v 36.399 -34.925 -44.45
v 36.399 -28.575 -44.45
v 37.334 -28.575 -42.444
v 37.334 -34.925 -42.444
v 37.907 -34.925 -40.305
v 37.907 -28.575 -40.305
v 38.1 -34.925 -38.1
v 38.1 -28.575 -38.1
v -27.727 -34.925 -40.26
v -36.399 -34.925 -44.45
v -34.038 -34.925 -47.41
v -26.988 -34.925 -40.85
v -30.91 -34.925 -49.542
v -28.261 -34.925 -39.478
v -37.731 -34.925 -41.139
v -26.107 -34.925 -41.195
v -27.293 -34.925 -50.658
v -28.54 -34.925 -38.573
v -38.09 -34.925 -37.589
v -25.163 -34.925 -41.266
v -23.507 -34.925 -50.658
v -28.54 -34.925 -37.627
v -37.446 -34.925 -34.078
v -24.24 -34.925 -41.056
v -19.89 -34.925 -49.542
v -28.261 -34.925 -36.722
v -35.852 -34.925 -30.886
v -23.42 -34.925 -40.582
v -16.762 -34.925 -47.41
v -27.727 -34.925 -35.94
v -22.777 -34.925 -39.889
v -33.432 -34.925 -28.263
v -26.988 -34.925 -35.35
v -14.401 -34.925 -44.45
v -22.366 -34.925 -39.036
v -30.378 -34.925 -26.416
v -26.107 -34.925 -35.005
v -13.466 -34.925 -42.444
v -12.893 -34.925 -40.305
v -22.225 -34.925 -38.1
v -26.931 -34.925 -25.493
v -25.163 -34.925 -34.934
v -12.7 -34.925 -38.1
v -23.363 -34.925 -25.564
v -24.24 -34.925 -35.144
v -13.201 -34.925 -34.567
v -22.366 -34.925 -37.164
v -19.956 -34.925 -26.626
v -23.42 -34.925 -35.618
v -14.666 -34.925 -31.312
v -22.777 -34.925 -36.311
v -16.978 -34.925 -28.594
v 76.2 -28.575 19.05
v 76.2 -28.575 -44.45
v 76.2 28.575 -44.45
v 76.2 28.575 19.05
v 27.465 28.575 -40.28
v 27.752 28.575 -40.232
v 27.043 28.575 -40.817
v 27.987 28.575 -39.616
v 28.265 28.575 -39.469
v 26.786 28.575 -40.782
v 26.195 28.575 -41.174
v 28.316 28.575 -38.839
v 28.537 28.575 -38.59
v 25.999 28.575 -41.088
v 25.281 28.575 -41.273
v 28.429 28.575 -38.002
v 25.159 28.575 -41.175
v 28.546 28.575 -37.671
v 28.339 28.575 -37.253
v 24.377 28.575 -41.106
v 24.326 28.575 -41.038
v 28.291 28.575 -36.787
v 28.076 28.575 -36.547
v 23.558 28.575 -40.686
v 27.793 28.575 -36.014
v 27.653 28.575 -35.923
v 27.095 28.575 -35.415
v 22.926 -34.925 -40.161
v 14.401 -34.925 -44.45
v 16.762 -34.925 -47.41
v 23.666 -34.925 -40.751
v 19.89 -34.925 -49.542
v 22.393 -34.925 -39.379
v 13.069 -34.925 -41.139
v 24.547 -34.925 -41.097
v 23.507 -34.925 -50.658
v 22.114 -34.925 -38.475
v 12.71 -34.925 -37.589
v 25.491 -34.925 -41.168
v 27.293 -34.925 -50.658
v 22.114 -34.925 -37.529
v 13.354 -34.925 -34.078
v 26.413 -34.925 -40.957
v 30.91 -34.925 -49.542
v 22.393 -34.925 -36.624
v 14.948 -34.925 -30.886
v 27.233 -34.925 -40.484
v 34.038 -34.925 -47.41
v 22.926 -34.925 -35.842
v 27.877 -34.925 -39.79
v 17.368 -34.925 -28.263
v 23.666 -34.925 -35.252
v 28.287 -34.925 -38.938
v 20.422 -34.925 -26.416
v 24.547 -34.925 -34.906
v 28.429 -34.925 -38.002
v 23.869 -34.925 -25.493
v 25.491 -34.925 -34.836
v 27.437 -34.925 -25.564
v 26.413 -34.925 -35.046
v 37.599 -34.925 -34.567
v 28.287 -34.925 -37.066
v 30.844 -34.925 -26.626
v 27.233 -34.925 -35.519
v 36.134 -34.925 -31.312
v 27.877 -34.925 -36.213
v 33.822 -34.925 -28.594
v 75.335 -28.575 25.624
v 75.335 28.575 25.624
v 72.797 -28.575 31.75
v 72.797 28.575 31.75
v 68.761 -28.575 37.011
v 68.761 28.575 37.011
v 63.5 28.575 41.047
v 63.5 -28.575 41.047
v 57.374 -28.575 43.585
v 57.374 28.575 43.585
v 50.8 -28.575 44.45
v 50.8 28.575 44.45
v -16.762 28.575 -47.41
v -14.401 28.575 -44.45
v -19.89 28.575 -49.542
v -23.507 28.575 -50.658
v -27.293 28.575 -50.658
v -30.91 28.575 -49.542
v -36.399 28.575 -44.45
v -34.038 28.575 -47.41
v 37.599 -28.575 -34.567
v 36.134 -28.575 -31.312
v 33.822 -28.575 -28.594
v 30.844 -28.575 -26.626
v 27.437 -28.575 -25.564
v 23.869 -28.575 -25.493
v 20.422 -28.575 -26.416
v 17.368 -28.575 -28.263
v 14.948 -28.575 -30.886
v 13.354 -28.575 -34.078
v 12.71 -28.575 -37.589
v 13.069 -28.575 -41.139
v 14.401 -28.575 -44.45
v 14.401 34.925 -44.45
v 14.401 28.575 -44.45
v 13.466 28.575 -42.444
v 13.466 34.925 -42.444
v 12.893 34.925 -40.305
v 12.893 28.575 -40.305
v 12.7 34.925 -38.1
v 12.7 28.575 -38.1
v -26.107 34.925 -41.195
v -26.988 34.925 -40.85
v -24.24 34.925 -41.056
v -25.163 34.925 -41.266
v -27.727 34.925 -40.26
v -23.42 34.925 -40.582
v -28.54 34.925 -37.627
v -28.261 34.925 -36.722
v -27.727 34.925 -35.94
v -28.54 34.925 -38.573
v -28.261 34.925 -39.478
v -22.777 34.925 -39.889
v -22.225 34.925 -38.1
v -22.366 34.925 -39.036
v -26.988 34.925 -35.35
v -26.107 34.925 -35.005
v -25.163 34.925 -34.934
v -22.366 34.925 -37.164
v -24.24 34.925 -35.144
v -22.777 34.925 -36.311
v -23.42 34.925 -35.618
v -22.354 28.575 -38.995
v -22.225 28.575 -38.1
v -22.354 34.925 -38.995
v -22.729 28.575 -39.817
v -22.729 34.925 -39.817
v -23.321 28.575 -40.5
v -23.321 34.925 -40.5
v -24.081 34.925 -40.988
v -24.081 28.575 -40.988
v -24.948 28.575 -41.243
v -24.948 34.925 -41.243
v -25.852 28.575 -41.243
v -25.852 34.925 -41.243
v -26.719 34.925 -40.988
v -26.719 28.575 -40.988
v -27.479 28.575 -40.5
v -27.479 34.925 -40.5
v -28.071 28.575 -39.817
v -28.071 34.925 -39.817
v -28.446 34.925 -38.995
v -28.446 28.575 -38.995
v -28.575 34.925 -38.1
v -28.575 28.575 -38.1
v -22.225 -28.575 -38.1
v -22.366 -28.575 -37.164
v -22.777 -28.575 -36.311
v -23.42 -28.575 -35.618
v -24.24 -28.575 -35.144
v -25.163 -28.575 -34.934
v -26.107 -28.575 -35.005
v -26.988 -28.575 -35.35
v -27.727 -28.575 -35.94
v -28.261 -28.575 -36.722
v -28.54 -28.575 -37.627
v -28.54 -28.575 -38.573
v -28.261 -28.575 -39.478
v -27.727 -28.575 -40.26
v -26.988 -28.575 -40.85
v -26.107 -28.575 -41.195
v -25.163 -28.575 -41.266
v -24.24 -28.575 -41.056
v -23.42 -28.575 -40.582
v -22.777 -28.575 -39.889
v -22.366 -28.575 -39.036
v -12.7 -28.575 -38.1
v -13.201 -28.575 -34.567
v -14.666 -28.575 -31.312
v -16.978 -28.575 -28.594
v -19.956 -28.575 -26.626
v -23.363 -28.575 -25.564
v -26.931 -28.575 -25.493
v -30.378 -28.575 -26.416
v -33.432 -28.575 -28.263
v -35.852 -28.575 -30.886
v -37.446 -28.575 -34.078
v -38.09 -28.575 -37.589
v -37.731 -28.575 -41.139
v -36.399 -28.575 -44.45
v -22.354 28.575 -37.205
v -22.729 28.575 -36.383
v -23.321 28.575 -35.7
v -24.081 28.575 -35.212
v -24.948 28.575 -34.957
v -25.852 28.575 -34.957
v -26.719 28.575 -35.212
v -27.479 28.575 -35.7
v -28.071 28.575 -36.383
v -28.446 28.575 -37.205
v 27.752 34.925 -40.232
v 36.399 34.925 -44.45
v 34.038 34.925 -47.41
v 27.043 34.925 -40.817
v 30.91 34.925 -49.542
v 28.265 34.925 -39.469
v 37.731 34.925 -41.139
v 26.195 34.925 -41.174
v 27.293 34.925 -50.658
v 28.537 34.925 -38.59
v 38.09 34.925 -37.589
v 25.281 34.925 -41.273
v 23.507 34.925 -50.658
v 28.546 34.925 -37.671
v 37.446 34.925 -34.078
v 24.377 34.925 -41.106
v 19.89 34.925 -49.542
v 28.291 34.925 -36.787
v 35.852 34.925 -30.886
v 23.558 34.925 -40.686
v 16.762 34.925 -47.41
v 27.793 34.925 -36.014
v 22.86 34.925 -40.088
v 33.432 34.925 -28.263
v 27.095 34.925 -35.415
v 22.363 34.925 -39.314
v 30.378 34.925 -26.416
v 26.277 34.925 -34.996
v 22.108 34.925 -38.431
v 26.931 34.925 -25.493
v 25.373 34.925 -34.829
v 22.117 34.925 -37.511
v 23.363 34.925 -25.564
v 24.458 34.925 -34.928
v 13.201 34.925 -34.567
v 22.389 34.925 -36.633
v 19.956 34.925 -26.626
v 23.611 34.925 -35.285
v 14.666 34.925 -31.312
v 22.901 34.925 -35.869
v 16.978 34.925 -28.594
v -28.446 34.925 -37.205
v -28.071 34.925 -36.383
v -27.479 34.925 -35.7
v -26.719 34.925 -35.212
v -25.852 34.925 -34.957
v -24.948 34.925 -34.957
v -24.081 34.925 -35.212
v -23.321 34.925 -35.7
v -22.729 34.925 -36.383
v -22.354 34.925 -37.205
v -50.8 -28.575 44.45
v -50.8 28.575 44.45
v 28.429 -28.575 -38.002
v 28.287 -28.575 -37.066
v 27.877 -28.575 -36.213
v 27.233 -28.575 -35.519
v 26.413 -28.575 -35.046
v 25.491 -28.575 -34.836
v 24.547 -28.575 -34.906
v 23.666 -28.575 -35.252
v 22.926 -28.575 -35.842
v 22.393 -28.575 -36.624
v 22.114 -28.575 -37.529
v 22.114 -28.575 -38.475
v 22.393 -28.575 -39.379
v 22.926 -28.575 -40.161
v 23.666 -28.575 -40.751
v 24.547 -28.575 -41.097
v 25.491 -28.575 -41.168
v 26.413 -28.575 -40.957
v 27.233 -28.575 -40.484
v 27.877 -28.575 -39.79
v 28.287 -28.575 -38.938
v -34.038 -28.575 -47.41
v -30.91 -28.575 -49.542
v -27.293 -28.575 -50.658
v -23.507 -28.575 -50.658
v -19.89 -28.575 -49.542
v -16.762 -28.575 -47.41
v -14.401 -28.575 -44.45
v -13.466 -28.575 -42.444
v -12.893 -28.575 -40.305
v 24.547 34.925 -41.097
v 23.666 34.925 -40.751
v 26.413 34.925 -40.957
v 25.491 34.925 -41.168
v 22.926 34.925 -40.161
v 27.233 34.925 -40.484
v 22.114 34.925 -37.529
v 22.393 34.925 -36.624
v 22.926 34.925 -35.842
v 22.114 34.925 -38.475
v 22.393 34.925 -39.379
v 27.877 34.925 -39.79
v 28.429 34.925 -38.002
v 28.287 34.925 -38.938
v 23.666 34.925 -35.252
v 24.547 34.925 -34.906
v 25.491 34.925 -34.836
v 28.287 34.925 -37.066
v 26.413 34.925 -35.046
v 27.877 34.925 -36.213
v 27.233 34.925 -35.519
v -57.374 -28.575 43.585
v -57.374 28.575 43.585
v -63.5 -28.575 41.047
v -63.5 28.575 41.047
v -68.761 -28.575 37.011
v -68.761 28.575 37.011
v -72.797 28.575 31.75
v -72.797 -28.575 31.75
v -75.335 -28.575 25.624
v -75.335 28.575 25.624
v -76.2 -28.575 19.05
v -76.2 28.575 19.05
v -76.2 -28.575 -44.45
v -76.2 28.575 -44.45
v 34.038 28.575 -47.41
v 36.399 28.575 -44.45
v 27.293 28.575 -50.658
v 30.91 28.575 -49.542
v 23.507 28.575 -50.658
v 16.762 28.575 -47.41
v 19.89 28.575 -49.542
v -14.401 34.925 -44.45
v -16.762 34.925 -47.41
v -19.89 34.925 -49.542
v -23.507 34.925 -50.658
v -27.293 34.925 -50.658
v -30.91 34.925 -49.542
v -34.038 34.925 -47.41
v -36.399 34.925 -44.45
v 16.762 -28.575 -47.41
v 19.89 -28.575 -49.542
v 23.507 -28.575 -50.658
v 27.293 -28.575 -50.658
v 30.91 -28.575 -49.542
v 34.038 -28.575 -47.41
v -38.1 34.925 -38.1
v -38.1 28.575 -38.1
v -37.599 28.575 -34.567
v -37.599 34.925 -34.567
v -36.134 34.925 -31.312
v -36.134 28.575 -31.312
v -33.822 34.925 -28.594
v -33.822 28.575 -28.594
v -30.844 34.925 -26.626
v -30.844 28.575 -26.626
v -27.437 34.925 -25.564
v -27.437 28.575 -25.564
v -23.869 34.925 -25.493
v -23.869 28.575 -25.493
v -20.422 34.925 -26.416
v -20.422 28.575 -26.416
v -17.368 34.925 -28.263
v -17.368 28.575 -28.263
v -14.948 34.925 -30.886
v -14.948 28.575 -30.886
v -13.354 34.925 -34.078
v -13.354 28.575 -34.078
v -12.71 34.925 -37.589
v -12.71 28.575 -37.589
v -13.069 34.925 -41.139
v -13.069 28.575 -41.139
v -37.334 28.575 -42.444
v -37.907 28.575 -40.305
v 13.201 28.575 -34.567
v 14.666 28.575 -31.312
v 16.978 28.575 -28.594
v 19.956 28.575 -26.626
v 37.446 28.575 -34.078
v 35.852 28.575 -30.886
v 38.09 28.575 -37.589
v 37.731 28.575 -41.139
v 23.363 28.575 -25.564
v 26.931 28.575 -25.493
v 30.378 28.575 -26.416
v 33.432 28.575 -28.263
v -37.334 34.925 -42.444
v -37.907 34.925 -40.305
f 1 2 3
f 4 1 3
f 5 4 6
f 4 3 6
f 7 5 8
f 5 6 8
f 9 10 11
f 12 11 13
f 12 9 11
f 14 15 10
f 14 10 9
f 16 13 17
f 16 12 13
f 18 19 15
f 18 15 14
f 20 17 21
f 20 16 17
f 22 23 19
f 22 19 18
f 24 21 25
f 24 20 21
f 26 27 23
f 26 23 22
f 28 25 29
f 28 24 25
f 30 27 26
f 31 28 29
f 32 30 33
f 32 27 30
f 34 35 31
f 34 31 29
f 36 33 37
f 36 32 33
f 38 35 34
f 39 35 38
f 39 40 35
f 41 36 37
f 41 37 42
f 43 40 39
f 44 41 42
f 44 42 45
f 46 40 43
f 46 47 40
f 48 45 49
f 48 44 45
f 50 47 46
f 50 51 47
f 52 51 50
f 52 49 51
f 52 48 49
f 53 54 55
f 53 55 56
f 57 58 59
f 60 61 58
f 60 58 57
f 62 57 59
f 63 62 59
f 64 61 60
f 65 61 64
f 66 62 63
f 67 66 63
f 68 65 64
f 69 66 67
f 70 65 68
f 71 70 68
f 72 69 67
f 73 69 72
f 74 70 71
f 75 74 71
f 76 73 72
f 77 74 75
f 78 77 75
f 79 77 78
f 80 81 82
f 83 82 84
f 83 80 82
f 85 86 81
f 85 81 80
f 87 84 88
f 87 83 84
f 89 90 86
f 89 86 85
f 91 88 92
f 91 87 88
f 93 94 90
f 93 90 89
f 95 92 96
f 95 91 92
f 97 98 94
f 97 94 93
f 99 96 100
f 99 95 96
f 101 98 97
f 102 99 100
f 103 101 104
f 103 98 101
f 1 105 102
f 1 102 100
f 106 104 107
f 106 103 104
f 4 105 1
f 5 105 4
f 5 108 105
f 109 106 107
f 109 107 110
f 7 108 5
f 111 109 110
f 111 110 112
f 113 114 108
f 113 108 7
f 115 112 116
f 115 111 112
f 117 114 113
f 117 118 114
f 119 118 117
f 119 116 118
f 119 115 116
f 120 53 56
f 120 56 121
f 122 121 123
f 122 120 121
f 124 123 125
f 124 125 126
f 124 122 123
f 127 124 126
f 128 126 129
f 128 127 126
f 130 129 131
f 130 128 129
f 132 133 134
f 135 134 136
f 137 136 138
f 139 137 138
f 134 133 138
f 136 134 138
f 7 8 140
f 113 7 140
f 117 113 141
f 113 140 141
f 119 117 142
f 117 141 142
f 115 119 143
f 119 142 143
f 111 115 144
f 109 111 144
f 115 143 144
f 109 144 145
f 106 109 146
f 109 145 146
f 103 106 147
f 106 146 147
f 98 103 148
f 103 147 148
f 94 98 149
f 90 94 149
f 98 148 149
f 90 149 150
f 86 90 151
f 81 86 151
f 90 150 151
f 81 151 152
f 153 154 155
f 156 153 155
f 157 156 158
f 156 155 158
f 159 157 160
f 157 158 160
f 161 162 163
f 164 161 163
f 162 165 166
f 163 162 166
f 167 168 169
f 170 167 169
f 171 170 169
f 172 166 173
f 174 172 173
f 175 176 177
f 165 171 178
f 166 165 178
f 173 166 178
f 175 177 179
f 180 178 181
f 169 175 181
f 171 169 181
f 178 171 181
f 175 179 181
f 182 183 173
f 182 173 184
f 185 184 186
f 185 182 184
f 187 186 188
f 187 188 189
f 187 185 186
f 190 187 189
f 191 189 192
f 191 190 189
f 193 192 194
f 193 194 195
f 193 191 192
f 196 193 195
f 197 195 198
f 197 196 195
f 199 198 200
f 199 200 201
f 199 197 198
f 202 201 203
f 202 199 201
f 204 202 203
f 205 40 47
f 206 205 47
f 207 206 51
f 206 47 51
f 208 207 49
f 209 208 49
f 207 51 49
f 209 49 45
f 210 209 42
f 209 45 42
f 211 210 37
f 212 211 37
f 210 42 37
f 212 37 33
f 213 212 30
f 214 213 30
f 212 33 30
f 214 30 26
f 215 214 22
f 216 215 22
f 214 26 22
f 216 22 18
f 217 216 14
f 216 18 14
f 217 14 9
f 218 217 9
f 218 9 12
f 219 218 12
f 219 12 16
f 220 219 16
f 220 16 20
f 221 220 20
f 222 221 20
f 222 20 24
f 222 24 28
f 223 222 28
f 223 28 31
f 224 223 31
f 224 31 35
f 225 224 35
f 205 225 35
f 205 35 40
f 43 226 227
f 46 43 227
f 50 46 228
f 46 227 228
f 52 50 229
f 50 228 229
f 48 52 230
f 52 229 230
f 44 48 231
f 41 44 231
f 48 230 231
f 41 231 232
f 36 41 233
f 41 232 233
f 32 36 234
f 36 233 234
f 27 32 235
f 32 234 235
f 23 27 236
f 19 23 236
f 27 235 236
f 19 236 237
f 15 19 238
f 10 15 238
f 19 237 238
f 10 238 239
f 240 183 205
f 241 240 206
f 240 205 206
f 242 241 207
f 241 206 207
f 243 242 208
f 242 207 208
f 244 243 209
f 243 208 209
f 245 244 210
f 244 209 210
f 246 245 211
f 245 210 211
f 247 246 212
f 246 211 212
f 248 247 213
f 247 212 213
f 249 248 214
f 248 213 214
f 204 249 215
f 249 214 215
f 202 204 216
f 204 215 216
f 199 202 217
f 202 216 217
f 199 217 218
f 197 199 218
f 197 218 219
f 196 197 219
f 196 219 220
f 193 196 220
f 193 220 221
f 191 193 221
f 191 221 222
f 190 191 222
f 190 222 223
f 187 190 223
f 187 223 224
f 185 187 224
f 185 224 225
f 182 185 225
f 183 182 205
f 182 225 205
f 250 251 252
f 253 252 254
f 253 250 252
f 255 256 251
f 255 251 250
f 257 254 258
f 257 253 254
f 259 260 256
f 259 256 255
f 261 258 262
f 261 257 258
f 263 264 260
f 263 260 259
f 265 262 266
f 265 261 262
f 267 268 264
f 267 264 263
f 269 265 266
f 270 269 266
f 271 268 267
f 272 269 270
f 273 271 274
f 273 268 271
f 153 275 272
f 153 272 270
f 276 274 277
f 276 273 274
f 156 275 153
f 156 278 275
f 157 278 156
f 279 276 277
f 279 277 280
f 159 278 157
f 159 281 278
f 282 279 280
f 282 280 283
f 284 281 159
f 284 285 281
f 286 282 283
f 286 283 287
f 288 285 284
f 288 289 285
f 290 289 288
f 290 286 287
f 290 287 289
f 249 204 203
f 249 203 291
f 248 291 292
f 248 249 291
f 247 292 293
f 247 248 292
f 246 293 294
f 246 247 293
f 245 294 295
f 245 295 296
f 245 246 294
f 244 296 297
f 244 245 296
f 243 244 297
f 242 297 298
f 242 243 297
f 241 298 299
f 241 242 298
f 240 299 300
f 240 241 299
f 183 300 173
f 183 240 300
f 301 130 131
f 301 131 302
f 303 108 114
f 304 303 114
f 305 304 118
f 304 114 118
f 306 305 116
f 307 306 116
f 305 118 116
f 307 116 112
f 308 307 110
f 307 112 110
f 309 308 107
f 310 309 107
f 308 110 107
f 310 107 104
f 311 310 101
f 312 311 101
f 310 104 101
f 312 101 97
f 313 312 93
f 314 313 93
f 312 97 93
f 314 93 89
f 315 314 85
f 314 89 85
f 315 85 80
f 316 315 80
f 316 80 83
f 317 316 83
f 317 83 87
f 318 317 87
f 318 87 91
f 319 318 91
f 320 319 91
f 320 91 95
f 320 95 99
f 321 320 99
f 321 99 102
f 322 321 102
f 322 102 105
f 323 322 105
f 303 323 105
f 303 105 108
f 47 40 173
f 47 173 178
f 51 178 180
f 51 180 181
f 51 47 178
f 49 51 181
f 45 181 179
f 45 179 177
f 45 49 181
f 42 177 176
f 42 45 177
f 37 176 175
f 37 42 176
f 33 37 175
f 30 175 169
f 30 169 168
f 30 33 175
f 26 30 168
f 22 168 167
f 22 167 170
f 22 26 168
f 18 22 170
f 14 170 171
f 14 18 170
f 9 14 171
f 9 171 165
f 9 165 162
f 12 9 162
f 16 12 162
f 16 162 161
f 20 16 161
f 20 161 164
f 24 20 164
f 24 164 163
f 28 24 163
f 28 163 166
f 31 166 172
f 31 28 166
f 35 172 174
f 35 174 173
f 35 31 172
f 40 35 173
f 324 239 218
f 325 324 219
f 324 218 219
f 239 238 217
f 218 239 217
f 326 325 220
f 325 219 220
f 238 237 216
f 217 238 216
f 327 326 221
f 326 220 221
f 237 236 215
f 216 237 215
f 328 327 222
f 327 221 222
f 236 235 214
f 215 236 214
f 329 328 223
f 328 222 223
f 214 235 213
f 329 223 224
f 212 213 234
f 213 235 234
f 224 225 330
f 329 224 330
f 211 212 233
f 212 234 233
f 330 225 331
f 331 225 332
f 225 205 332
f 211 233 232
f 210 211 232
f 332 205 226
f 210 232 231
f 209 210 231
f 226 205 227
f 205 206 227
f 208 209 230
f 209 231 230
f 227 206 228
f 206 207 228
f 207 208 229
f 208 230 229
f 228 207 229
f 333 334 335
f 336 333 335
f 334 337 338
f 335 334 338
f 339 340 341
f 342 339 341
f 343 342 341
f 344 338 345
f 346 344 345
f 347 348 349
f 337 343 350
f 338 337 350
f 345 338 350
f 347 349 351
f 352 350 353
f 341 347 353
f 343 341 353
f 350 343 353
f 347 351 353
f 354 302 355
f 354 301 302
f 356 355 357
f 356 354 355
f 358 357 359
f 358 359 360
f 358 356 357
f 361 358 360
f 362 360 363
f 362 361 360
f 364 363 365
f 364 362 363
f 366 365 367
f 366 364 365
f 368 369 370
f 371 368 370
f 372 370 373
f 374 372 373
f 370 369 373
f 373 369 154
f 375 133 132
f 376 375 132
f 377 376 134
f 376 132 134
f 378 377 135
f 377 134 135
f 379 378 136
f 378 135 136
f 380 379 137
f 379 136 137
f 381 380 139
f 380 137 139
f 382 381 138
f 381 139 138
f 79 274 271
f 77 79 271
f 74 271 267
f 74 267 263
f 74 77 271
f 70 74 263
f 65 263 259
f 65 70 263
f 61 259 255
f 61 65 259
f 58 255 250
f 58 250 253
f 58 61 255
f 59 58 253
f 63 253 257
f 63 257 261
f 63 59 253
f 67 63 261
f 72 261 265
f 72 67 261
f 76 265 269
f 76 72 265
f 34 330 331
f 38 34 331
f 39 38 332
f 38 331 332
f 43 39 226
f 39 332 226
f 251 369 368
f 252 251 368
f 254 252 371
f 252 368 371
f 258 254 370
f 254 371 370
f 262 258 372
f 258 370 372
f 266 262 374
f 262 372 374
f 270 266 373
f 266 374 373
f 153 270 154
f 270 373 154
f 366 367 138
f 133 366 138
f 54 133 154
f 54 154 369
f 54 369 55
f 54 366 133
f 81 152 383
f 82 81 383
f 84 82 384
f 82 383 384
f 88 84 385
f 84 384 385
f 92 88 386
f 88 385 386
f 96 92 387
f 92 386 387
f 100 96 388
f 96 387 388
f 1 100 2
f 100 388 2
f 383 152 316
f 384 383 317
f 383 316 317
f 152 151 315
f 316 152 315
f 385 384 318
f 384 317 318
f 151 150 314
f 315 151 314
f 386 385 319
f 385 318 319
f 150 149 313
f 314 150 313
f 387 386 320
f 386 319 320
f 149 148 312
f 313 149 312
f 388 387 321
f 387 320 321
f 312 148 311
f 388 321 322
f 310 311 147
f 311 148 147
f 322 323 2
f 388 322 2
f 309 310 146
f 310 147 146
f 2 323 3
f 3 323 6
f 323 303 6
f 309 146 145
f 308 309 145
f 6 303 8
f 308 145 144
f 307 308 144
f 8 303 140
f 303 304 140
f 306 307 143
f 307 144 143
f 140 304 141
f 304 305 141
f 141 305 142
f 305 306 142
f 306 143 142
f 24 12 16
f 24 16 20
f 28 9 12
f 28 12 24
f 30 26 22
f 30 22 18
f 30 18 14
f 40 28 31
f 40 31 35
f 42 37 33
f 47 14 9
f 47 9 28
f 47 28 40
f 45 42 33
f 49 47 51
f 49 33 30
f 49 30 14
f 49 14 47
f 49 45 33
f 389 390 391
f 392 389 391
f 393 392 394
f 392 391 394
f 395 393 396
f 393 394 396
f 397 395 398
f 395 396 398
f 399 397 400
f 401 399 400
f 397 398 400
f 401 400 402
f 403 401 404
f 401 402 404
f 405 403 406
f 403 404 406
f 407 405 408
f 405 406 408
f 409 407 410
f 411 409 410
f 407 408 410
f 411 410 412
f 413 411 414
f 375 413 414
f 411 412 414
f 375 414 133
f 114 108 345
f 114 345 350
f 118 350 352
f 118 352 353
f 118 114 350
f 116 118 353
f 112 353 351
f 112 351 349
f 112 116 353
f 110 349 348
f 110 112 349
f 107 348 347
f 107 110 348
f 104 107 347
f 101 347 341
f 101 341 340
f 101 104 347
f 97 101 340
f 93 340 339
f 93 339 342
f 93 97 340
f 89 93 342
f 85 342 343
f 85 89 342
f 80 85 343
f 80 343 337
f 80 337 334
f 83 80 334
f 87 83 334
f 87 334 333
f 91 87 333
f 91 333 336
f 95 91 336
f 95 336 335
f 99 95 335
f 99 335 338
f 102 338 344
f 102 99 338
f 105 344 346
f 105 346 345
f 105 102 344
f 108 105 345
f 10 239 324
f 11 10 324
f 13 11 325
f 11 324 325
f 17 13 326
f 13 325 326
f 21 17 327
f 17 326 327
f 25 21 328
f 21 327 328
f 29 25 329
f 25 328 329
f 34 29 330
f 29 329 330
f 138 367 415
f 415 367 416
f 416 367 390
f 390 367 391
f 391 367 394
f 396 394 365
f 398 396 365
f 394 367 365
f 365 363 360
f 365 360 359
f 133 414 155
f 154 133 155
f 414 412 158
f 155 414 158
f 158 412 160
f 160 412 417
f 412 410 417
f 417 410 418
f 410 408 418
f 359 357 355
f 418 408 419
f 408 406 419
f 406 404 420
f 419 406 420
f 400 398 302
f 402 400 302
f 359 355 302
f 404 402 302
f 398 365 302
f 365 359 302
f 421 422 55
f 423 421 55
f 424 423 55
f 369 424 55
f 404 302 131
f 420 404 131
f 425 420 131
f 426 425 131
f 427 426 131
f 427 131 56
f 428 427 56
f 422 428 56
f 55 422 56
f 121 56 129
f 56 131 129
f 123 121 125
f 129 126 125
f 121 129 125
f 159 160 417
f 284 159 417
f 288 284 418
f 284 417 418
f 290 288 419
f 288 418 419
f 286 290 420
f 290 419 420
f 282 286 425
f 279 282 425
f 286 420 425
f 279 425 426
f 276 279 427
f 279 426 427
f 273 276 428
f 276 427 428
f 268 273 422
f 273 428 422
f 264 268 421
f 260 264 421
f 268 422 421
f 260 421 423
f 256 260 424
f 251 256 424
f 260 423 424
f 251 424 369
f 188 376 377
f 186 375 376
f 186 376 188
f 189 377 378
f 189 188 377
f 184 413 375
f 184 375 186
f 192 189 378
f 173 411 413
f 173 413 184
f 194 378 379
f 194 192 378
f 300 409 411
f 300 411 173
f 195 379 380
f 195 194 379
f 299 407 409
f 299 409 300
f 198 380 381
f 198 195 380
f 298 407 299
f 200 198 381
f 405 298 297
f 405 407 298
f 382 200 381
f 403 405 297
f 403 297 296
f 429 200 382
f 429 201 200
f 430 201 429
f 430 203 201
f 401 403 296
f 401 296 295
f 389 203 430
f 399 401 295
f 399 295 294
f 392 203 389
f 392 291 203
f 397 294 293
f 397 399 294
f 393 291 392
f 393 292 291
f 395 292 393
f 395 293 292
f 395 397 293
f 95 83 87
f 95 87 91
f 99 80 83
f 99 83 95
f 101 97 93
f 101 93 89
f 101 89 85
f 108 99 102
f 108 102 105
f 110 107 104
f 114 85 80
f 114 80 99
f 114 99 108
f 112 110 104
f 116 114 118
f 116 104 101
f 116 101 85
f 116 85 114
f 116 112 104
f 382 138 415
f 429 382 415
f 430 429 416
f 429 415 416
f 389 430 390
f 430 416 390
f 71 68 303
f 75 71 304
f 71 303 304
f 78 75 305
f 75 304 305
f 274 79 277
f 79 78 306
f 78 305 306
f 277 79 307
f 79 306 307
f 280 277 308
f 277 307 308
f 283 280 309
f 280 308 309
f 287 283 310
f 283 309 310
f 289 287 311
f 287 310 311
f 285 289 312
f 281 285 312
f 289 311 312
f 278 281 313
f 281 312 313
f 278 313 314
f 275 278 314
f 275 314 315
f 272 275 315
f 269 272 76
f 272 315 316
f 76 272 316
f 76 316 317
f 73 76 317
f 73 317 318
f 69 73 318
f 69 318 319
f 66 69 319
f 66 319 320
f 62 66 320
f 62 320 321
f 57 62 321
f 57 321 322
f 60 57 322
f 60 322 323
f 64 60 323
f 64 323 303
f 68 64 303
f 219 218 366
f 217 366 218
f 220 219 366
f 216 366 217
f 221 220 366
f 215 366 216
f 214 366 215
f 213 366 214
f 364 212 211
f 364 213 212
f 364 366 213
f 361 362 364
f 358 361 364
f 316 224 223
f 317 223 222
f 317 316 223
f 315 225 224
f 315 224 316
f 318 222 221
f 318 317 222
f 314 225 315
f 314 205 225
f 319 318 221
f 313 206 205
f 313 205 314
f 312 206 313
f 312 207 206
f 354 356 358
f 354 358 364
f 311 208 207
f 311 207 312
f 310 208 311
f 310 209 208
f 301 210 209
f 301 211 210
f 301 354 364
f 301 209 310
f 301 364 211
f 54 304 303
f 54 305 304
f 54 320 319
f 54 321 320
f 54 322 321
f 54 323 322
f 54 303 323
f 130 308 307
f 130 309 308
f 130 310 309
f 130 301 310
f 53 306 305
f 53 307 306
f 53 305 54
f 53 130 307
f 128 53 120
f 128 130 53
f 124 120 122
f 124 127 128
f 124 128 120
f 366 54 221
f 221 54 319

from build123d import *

# Parameters (mm, degrees)
F1_DEPTH    = 28.575
F3_DEPTH    = 6.35
F4_R        = 3.175
F5_DEPTH    = 6.35
F6_R        = 3.175
F5_FACE_R   = 12.7
F5_FACE_R_2 = 3.175
F7_DEPTH    = 69.851
F8_DEPTH    = 69.85


# Not quite as in the source:
# - a feature names something its author has since deleted; it is built from what else it names


with BuildPart() as f1:
    # F0 (on Front) → F1 (new body, symmetric)
    with BuildSketch(Plane.XZ):
        with BuildLine():
            Line((-76.2, -44.45), (76.2, -44.45))
            Line((76.2, -44.45), (76.2, 19.05))
            ThreePointArc((76.2, 19.05), (68.7605122421, 37.0105122421), (50.8, 44.45))
            Line((50.8, 44.45), (-50.8, 44.45))
            ThreePointArc((-50.8, 44.45), (-68.7605122421, 37.0105122421), (-76.2, 19.05))
            Line((-76.2, 19.05), (-76.2, -44.45))
        make_face()
    extrude(amount=F1_DEPTH, both=True)

    # F4 (on face) → F5 (join)
    with BuildSketch(Plane(origin=(0, 28.575, 0), x_dir=(-1, 0, 0), z_dir=(0, 1, 0))):
        with BuildLine():
            Line((-14.4014773719, -44.45), (-36.3985226281, -44.45))
            ThreePointArc((-36.3985226281, -44.45), (-25.4, -50.8), (-14.4014773719, -44.45))
        make_face()
        with BuildLine():
            ThreePointArc((38.1, -38.1), (22.1129981272, -25.8327420061), (14.4014773719, -44.45))
            Line((14.4014773719, -44.45), (36.3985226281, -44.45))
            ThreePointArc((36.3985226281, -44.45), (37.6672579939, -41.3870018728), (38.1, -38.1))
        make_face()
        with Locations((25.4, -38.1)):
            Circle(F4_R, mode=Mode.SUBTRACT)
        with BuildLine():
            Line((36.3985226281, -44.45), (14.4014773719, -44.45))
            ThreePointArc((14.4014773719, -44.45), (25.4, -50.8), (36.3985226281, -44.45))
        make_face()
        with BuildLine():
            ThreePointArc((-14.4014773719, -44.45), (-13.1327420061, -41.3870018728), (-12.7, -38.1))
            ThreePointArc((-12.7, -38.1), (-28.6870018728, -25.8327420061), (-36.3985226281, -44.45))
            Line((-36.3985226281, -44.45), (-14.4014773719, -44.45))
        make_face()
        with Locations((-25.4, -38.1)):
            Circle(F4_R, mode=Mode.SUBTRACT)
    extrude(amount=F5_DEPTH)


with BuildPart() as f3:
    # F2 (on face) → F3 (new body)
    with BuildSketch(Plane.XZ.offset(28.575)):
        with BuildLine():
            ThreePointArc((-36.3985226281, -44.45), (-25.4, -50.8), (-14.4014773719, -44.45))
            Line((-14.4014773719, -44.45), (-36.3985226281, -44.45))
        make_face()
        with BuildLine():
            Line((-36.3985226281, -44.45), (-14.4014773719, -44.45))
            ThreePointArc((-14.4014773719, -44.45), (-13.1327420061, -41.3870018728), (-12.7, -38.1))
            ThreePointArc((-12.7, -38.1), (-28.6870018728, -25.8327420061), (-36.3985226281, -44.45))
        make_face()
    extrude(amount=F3_DEPTH)


with BuildPart() as f3b:
    # F2 (on face) → F3, piece 2 (new body)
    with BuildSketch(Plane.XZ.offset(28.575)):
        with BuildLine():
            ThreePointArc((36.3985226281, -44.45), (37.6672579939, -41.3870018728), (38.1, -38.1))
            ThreePointArc((38.1, -38.1), (22.1129981272, -25.8327420061), (14.4014773719, -44.45))
            Line((14.4014773719, -44.45), (36.3985226281, -44.45))
        make_face()
        with BuildLine():
            Line((36.3985226281, -44.45), (14.4014773719, -44.45))
            ThreePointArc((14.4014773719, -44.45), (25.4, -50.8), (36.3985226281, -44.45))
        make_face()
    extrude(amount=F3_DEPTH)


with BuildPart() as f7_tool:
    # F6 (on face) + F4 (on face) + F5_face (on face) → F7 (new body, through all)
    with BuildSketch(Plane.XZ.offset(34.925)):
        with Locations((-25.4, -38.1)):
            Circle(F6_R)
        with Locations((25.2535380423, -38.0017161369)):
            Circle(F6_R)
    with BuildSketch(Plane(origin=(0, 28.575, 0), x_dir=(-1, 0, 0), z_dir=(0, 1, 0))):
        with Locations((-25.4, -38.1)):
            Circle(F4_R)
        with Locations((25.4, -38.1)):
            Circle(F4_R)
    with BuildSketch(Plane(origin=(-25.4, 34.925, -38.1), x_dir=(-1, 0, 0), z_dir=(0, 1, 0))):
        Circle(F5_FACE_R)
        Circle(F5_FACE_R_2, mode=Mode.SUBTRACT)
        with Locations((-50.8, 0)):
            Circle(F5_FACE_R)
        with Locations((-50.8, 0)):
            Circle(F5_FACE_R_2, mode=Mode.SUBTRACT)
    extrude(amount=-F7_DEPTH, dir=(0, -1, 0))


with BuildPart() as f1_1:
    add(f1.part)

    # F7: cut by f7_tool
    add(f7_tool.part, mode=Mode.SUBTRACT)


with BuildPart() as f3_1:
    add(f3.part)

    # F7: cut by f7_tool
    add(f7_tool.part, mode=Mode.SUBTRACT)


with BuildPart() as f3b_1:
    add(f3b.part)

    # F7: cut by f7_tool
    add(f7_tool.part, mode=Mode.SUBTRACT)


with BuildPart() as f8:
    # F6 (on face) → F8 (new body)
    with BuildSketch(Plane.XZ.offset(34.925)):
        with Locations((-25.4, -38.1)):
            Circle(F6_R)
    extrude(amount=-F8_DEPTH)


with BuildPart() as f8b:
    # F6 (on face) → F8, piece 2 (new body)
    with BuildSketch(Plane.XZ.offset(34.925)):
        with Locations((25.2535380423, -38.0017161369)):
            Circle(F6_R)
    extrude(amount=-F8_DEPTH)


solid = Compound([f1_1.part, f3_1.part, f3b_1.part, f8.part, f8b.part])
